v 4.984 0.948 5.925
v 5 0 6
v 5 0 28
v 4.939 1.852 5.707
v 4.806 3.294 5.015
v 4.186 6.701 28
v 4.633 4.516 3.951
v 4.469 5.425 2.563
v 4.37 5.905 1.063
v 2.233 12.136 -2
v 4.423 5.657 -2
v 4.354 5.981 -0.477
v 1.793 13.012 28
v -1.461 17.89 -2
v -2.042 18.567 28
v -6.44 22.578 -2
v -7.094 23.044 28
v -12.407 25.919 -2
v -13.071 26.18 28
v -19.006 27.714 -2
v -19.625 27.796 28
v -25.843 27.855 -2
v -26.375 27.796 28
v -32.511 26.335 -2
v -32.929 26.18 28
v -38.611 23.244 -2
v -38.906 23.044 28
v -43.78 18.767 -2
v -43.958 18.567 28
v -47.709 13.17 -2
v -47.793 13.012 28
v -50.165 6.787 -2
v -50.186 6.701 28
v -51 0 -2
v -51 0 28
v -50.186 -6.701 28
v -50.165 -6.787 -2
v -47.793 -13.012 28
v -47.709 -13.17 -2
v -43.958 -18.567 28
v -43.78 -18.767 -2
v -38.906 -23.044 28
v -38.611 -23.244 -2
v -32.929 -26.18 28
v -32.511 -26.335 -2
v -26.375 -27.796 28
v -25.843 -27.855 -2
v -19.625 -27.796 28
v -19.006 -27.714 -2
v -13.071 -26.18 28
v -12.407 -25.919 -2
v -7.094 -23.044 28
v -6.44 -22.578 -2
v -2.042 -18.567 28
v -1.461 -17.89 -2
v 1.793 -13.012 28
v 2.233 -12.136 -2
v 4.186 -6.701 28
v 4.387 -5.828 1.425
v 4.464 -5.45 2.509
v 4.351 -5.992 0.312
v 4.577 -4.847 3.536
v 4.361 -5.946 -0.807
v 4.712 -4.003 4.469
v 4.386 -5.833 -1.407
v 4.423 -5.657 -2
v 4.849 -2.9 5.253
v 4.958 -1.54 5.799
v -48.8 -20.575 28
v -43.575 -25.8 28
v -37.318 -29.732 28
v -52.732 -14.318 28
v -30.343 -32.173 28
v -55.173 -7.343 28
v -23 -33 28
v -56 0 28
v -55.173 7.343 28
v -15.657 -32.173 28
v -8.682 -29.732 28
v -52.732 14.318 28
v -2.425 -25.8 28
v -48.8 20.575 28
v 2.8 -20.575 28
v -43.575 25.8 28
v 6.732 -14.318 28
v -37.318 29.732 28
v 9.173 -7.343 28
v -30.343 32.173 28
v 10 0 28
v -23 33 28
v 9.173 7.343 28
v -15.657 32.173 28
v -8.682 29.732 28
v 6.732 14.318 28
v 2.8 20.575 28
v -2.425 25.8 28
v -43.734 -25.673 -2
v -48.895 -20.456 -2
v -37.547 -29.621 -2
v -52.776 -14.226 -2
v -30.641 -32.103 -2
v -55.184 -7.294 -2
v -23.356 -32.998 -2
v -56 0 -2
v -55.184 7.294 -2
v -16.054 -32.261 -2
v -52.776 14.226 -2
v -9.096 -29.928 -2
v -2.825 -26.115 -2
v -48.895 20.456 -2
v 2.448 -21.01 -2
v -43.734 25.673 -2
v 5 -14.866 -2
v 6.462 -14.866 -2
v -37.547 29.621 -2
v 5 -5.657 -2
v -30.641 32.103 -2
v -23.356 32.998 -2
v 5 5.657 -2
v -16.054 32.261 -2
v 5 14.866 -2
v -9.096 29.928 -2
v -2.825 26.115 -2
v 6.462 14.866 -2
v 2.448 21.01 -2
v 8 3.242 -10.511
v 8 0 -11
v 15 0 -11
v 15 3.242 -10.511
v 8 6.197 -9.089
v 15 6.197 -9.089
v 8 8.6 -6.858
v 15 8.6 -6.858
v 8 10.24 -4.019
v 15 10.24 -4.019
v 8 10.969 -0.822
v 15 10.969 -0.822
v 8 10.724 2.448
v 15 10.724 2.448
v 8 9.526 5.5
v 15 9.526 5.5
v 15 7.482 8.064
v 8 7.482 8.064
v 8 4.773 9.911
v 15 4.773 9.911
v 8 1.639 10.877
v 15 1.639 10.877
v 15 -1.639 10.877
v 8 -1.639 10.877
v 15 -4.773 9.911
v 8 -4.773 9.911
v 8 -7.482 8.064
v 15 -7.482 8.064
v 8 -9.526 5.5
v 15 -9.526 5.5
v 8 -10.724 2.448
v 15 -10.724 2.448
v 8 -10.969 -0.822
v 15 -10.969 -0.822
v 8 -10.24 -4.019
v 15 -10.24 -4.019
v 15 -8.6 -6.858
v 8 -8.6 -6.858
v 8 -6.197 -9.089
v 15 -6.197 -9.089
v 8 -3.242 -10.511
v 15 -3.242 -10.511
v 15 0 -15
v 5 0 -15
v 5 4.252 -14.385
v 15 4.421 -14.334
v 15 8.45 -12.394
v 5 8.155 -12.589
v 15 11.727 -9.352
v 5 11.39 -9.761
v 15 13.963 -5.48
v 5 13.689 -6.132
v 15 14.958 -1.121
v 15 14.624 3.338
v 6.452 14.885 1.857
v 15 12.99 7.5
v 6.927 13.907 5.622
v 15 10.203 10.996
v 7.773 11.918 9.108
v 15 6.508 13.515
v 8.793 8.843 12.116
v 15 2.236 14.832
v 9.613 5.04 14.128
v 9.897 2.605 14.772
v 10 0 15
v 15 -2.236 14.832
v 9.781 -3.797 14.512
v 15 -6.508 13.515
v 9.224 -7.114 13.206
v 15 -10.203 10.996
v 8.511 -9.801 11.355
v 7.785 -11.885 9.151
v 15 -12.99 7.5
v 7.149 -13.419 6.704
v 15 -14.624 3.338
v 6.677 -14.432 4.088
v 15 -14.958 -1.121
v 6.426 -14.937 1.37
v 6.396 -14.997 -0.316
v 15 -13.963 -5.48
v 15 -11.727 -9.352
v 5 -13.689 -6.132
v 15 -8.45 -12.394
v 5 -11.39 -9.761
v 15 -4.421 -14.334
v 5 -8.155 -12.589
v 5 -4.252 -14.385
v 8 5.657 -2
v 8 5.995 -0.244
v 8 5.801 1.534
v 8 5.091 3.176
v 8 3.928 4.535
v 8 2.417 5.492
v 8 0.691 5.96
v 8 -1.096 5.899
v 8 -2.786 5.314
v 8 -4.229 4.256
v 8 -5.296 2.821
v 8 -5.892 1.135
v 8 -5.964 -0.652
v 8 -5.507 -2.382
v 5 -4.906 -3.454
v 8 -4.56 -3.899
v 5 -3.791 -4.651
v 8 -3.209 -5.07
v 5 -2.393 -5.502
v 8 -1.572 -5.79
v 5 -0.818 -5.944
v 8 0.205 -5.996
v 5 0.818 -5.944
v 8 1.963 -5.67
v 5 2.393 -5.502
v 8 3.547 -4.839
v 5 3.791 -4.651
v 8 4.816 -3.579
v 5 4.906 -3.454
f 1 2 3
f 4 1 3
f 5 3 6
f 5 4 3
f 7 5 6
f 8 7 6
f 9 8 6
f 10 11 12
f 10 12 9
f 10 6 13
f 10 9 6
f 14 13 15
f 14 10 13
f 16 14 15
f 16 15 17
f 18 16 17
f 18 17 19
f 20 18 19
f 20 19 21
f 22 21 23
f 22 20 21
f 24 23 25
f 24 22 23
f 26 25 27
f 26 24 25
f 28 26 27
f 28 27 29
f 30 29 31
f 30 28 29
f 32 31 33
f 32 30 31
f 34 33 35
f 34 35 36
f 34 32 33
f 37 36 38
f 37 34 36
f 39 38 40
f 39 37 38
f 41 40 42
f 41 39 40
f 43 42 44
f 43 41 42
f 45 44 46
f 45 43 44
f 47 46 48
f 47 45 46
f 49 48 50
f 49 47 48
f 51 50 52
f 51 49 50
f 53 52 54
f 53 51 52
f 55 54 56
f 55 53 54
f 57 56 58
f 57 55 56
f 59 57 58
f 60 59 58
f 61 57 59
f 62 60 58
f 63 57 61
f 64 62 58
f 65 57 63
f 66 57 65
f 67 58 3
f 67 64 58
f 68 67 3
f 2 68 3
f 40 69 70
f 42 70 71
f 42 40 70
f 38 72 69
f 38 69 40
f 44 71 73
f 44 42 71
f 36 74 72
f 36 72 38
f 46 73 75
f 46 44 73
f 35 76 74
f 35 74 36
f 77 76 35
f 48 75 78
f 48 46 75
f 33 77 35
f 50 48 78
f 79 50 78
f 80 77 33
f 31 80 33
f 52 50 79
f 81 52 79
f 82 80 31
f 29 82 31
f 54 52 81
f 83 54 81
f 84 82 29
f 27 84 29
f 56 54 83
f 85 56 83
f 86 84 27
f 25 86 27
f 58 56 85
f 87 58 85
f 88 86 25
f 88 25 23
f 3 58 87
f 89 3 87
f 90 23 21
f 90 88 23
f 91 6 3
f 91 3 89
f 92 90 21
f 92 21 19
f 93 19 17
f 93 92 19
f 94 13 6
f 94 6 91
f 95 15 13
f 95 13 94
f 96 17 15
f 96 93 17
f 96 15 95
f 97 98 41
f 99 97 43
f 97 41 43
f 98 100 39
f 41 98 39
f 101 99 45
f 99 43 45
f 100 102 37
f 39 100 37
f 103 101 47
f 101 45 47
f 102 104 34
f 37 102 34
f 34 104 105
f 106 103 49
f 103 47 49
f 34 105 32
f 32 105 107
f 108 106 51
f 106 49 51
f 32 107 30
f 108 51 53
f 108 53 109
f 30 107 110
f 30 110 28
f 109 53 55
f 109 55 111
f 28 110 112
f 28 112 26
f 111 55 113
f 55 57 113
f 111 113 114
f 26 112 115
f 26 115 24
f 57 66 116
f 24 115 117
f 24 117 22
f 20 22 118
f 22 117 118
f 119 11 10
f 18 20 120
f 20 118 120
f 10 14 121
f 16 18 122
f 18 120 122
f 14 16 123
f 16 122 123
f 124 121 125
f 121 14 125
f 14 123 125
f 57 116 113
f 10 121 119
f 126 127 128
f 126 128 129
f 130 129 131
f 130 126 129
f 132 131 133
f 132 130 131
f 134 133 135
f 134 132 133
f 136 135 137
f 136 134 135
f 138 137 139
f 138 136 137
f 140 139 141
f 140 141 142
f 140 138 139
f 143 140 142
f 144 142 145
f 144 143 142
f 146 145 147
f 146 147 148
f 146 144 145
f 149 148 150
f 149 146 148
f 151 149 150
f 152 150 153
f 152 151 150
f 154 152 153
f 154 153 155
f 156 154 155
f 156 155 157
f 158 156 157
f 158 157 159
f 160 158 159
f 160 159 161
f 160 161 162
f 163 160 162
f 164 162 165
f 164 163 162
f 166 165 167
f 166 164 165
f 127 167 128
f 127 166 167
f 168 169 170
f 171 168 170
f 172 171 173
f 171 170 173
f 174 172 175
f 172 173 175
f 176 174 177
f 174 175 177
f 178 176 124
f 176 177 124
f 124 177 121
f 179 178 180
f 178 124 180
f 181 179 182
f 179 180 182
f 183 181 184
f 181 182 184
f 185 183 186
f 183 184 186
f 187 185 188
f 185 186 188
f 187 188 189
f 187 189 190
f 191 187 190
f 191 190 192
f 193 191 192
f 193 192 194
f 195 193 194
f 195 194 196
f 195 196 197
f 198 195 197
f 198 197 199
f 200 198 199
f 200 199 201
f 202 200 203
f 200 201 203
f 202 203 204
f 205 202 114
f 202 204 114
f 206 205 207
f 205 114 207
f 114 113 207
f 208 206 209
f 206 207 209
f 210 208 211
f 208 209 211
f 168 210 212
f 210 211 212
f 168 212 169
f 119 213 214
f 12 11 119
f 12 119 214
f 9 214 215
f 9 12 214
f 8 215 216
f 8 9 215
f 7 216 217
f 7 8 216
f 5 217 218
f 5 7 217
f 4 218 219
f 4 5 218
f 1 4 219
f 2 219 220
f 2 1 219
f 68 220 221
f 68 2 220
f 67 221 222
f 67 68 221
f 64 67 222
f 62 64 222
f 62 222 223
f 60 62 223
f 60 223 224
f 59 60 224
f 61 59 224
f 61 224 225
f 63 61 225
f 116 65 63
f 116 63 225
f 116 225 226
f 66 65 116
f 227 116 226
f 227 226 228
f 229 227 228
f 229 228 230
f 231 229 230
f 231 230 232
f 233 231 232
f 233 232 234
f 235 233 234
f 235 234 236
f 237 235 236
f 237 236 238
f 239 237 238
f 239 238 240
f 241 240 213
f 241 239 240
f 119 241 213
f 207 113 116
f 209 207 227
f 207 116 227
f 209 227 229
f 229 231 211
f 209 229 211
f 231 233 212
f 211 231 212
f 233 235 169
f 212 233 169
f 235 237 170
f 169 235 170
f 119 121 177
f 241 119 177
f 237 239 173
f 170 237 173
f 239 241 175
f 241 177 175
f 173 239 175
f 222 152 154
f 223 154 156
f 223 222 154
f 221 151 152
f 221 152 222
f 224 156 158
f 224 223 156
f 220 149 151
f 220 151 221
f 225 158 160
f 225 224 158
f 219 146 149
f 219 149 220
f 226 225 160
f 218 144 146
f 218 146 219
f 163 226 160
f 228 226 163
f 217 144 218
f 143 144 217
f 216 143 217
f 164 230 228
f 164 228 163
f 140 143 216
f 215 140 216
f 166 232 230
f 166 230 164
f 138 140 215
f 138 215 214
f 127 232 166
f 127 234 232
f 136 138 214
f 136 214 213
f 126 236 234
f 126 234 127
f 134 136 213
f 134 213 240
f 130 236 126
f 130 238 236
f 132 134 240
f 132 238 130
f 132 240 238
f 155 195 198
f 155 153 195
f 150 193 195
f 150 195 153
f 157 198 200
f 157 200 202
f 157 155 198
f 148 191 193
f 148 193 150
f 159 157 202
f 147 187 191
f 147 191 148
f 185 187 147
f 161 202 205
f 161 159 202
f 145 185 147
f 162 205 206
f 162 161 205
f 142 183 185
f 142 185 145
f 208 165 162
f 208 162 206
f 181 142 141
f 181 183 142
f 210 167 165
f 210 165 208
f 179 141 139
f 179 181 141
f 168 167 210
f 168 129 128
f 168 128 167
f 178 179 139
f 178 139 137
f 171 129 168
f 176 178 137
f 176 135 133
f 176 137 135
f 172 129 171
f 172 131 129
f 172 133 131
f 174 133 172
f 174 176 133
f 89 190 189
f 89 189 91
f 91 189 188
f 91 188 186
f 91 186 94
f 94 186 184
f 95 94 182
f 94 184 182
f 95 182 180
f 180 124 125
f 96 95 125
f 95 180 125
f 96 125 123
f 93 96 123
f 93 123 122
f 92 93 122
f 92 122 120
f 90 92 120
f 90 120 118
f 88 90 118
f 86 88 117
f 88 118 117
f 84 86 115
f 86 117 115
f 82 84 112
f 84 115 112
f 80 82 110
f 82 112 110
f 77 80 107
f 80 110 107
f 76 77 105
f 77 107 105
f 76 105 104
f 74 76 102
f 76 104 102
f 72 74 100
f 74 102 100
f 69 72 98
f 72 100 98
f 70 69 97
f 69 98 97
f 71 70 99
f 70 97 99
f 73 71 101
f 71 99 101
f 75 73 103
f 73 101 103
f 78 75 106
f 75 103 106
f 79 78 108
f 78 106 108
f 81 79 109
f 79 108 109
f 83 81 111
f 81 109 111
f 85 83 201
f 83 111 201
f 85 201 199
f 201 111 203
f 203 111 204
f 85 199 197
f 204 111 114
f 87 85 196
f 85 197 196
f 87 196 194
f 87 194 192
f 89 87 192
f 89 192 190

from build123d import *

# Parameters (mm, degrees)
CYLINDER115_R             = 6
CYLINDER115_DEPTH         = 38
CYLINDER114_R             = 11
CYLINDER114_DEPTH         = 7
FUSION033_PLACEMENT_ANGLE = 90
CYLINDER102_R             = 6
CYLINDER102_DEPTH         = 10
CYLINDER104_R             = 11
CYLINDER104_DEPTH         = 7
CYLINDER103_R             = 15
CYLINDER103_DEPTH         = 10
CUT114_PLACEMENT_ANGLE    = 90
CYLINDER112_R             = 28
CYLINDER112_DEPTH         = 30
CYLINDER113_R             = 33
CYLINDER113_DEPTH         = 30


with BuildPart() as center_cylinder043:
    # Cylinder115 → Cylinder115 (new body)
    with BuildSketch(Plane.XY.offset(-9)):
        Circle(CYLINDER115_R)
    extrude(amount=CYLINDER115_DEPTH)


with BuildPart() as fusion033:
    # Cylinder114 → Cylinder114 (new body)
    with BuildSketch(Plane.XY.offset(8)):
        Circle(CYLINDER114_R)
    extrude(amount=CYLINDER114_DEPTH)

    # Fusion033: union center-Cylinder043
    add(center_cylinder043.part)


with BuildPart() as fusion033_1:
    # Fusion033 placement: moved
    add(fusion033.part.rotate(Axis((0, 0, 0), (0, 1, 0)), FUSION033_PLACEMENT_ANGLE))


with BuildPart() as center_cylinder039:
    # Cylinder102 → Cylinder102 (new body)
    with BuildSketch(Plane.XY.offset(5)):
        Circle(CYLINDER102_R)
    extrude(amount=CYLINDER102_DEPTH)


with BuildPart() as center_cylinder041:
    # Cylinder104 → Cylinder104 (new body)
    with BuildSketch(Plane.XY.offset(8)):
        Circle(CYLINDER104_R)
    extrude(amount=CYLINDER104_DEPTH)


with BuildPart() as cut114:
    # Cylinder103 → Cylinder103 (new body)
    with BuildSketch(Plane.XY.offset(5)):
        Circle(CYLINDER103_R)
    extrude(amount=CYLINDER103_DEPTH)

    # Cut113: cut center-Cylinder041
    add(center_cylinder041.part, mode=Mode.SUBTRACT)

    # Cut114: cut center-Cylinder039
    add(center_cylinder039.part, mode=Mode.SUBTRACT)


with BuildPart() as cut114_1:
    # Cut114 placement: moved
    add(cut114.part.rotate(Axis((0, 0, 0), (0, 1, 0)), CUT114_PLACEMENT_ANGLE))


with BuildPart() as cylinder112:
    # Cylinder112 → Cylinder112 (new body)
    with BuildSketch(Plane(origin=(-23, 0, -2), x_dir=(1, 0, 0), z_dir=(0, 0, 1))):
        Circle(CYLINDER112_R)
    extrude(amount=CYLINDER112_DEPTH)


with BuildPart() as cut120:
    # Cylinder113 → Cylinder113 (new body)
    with BuildSketch(Plane(origin=(-23, 0, -2), x_dir=(1, 0, 0), z_dir=(0, 0, 1))):
        Circle(CYLINDER113_R)
    extrude(amount=CYLINDER113_DEPTH)

    # Cut119: cut Cylinder112
    add(cylinder112.part, mode=Mode.SUBTRACT)

    # Fusion034: union Cut114
    add(cut114_1.part)

    # Cut120: cut Fusion033
    add(fusion033_1.part, mode=Mode.SUBTRACT)


solid = cut120.part
